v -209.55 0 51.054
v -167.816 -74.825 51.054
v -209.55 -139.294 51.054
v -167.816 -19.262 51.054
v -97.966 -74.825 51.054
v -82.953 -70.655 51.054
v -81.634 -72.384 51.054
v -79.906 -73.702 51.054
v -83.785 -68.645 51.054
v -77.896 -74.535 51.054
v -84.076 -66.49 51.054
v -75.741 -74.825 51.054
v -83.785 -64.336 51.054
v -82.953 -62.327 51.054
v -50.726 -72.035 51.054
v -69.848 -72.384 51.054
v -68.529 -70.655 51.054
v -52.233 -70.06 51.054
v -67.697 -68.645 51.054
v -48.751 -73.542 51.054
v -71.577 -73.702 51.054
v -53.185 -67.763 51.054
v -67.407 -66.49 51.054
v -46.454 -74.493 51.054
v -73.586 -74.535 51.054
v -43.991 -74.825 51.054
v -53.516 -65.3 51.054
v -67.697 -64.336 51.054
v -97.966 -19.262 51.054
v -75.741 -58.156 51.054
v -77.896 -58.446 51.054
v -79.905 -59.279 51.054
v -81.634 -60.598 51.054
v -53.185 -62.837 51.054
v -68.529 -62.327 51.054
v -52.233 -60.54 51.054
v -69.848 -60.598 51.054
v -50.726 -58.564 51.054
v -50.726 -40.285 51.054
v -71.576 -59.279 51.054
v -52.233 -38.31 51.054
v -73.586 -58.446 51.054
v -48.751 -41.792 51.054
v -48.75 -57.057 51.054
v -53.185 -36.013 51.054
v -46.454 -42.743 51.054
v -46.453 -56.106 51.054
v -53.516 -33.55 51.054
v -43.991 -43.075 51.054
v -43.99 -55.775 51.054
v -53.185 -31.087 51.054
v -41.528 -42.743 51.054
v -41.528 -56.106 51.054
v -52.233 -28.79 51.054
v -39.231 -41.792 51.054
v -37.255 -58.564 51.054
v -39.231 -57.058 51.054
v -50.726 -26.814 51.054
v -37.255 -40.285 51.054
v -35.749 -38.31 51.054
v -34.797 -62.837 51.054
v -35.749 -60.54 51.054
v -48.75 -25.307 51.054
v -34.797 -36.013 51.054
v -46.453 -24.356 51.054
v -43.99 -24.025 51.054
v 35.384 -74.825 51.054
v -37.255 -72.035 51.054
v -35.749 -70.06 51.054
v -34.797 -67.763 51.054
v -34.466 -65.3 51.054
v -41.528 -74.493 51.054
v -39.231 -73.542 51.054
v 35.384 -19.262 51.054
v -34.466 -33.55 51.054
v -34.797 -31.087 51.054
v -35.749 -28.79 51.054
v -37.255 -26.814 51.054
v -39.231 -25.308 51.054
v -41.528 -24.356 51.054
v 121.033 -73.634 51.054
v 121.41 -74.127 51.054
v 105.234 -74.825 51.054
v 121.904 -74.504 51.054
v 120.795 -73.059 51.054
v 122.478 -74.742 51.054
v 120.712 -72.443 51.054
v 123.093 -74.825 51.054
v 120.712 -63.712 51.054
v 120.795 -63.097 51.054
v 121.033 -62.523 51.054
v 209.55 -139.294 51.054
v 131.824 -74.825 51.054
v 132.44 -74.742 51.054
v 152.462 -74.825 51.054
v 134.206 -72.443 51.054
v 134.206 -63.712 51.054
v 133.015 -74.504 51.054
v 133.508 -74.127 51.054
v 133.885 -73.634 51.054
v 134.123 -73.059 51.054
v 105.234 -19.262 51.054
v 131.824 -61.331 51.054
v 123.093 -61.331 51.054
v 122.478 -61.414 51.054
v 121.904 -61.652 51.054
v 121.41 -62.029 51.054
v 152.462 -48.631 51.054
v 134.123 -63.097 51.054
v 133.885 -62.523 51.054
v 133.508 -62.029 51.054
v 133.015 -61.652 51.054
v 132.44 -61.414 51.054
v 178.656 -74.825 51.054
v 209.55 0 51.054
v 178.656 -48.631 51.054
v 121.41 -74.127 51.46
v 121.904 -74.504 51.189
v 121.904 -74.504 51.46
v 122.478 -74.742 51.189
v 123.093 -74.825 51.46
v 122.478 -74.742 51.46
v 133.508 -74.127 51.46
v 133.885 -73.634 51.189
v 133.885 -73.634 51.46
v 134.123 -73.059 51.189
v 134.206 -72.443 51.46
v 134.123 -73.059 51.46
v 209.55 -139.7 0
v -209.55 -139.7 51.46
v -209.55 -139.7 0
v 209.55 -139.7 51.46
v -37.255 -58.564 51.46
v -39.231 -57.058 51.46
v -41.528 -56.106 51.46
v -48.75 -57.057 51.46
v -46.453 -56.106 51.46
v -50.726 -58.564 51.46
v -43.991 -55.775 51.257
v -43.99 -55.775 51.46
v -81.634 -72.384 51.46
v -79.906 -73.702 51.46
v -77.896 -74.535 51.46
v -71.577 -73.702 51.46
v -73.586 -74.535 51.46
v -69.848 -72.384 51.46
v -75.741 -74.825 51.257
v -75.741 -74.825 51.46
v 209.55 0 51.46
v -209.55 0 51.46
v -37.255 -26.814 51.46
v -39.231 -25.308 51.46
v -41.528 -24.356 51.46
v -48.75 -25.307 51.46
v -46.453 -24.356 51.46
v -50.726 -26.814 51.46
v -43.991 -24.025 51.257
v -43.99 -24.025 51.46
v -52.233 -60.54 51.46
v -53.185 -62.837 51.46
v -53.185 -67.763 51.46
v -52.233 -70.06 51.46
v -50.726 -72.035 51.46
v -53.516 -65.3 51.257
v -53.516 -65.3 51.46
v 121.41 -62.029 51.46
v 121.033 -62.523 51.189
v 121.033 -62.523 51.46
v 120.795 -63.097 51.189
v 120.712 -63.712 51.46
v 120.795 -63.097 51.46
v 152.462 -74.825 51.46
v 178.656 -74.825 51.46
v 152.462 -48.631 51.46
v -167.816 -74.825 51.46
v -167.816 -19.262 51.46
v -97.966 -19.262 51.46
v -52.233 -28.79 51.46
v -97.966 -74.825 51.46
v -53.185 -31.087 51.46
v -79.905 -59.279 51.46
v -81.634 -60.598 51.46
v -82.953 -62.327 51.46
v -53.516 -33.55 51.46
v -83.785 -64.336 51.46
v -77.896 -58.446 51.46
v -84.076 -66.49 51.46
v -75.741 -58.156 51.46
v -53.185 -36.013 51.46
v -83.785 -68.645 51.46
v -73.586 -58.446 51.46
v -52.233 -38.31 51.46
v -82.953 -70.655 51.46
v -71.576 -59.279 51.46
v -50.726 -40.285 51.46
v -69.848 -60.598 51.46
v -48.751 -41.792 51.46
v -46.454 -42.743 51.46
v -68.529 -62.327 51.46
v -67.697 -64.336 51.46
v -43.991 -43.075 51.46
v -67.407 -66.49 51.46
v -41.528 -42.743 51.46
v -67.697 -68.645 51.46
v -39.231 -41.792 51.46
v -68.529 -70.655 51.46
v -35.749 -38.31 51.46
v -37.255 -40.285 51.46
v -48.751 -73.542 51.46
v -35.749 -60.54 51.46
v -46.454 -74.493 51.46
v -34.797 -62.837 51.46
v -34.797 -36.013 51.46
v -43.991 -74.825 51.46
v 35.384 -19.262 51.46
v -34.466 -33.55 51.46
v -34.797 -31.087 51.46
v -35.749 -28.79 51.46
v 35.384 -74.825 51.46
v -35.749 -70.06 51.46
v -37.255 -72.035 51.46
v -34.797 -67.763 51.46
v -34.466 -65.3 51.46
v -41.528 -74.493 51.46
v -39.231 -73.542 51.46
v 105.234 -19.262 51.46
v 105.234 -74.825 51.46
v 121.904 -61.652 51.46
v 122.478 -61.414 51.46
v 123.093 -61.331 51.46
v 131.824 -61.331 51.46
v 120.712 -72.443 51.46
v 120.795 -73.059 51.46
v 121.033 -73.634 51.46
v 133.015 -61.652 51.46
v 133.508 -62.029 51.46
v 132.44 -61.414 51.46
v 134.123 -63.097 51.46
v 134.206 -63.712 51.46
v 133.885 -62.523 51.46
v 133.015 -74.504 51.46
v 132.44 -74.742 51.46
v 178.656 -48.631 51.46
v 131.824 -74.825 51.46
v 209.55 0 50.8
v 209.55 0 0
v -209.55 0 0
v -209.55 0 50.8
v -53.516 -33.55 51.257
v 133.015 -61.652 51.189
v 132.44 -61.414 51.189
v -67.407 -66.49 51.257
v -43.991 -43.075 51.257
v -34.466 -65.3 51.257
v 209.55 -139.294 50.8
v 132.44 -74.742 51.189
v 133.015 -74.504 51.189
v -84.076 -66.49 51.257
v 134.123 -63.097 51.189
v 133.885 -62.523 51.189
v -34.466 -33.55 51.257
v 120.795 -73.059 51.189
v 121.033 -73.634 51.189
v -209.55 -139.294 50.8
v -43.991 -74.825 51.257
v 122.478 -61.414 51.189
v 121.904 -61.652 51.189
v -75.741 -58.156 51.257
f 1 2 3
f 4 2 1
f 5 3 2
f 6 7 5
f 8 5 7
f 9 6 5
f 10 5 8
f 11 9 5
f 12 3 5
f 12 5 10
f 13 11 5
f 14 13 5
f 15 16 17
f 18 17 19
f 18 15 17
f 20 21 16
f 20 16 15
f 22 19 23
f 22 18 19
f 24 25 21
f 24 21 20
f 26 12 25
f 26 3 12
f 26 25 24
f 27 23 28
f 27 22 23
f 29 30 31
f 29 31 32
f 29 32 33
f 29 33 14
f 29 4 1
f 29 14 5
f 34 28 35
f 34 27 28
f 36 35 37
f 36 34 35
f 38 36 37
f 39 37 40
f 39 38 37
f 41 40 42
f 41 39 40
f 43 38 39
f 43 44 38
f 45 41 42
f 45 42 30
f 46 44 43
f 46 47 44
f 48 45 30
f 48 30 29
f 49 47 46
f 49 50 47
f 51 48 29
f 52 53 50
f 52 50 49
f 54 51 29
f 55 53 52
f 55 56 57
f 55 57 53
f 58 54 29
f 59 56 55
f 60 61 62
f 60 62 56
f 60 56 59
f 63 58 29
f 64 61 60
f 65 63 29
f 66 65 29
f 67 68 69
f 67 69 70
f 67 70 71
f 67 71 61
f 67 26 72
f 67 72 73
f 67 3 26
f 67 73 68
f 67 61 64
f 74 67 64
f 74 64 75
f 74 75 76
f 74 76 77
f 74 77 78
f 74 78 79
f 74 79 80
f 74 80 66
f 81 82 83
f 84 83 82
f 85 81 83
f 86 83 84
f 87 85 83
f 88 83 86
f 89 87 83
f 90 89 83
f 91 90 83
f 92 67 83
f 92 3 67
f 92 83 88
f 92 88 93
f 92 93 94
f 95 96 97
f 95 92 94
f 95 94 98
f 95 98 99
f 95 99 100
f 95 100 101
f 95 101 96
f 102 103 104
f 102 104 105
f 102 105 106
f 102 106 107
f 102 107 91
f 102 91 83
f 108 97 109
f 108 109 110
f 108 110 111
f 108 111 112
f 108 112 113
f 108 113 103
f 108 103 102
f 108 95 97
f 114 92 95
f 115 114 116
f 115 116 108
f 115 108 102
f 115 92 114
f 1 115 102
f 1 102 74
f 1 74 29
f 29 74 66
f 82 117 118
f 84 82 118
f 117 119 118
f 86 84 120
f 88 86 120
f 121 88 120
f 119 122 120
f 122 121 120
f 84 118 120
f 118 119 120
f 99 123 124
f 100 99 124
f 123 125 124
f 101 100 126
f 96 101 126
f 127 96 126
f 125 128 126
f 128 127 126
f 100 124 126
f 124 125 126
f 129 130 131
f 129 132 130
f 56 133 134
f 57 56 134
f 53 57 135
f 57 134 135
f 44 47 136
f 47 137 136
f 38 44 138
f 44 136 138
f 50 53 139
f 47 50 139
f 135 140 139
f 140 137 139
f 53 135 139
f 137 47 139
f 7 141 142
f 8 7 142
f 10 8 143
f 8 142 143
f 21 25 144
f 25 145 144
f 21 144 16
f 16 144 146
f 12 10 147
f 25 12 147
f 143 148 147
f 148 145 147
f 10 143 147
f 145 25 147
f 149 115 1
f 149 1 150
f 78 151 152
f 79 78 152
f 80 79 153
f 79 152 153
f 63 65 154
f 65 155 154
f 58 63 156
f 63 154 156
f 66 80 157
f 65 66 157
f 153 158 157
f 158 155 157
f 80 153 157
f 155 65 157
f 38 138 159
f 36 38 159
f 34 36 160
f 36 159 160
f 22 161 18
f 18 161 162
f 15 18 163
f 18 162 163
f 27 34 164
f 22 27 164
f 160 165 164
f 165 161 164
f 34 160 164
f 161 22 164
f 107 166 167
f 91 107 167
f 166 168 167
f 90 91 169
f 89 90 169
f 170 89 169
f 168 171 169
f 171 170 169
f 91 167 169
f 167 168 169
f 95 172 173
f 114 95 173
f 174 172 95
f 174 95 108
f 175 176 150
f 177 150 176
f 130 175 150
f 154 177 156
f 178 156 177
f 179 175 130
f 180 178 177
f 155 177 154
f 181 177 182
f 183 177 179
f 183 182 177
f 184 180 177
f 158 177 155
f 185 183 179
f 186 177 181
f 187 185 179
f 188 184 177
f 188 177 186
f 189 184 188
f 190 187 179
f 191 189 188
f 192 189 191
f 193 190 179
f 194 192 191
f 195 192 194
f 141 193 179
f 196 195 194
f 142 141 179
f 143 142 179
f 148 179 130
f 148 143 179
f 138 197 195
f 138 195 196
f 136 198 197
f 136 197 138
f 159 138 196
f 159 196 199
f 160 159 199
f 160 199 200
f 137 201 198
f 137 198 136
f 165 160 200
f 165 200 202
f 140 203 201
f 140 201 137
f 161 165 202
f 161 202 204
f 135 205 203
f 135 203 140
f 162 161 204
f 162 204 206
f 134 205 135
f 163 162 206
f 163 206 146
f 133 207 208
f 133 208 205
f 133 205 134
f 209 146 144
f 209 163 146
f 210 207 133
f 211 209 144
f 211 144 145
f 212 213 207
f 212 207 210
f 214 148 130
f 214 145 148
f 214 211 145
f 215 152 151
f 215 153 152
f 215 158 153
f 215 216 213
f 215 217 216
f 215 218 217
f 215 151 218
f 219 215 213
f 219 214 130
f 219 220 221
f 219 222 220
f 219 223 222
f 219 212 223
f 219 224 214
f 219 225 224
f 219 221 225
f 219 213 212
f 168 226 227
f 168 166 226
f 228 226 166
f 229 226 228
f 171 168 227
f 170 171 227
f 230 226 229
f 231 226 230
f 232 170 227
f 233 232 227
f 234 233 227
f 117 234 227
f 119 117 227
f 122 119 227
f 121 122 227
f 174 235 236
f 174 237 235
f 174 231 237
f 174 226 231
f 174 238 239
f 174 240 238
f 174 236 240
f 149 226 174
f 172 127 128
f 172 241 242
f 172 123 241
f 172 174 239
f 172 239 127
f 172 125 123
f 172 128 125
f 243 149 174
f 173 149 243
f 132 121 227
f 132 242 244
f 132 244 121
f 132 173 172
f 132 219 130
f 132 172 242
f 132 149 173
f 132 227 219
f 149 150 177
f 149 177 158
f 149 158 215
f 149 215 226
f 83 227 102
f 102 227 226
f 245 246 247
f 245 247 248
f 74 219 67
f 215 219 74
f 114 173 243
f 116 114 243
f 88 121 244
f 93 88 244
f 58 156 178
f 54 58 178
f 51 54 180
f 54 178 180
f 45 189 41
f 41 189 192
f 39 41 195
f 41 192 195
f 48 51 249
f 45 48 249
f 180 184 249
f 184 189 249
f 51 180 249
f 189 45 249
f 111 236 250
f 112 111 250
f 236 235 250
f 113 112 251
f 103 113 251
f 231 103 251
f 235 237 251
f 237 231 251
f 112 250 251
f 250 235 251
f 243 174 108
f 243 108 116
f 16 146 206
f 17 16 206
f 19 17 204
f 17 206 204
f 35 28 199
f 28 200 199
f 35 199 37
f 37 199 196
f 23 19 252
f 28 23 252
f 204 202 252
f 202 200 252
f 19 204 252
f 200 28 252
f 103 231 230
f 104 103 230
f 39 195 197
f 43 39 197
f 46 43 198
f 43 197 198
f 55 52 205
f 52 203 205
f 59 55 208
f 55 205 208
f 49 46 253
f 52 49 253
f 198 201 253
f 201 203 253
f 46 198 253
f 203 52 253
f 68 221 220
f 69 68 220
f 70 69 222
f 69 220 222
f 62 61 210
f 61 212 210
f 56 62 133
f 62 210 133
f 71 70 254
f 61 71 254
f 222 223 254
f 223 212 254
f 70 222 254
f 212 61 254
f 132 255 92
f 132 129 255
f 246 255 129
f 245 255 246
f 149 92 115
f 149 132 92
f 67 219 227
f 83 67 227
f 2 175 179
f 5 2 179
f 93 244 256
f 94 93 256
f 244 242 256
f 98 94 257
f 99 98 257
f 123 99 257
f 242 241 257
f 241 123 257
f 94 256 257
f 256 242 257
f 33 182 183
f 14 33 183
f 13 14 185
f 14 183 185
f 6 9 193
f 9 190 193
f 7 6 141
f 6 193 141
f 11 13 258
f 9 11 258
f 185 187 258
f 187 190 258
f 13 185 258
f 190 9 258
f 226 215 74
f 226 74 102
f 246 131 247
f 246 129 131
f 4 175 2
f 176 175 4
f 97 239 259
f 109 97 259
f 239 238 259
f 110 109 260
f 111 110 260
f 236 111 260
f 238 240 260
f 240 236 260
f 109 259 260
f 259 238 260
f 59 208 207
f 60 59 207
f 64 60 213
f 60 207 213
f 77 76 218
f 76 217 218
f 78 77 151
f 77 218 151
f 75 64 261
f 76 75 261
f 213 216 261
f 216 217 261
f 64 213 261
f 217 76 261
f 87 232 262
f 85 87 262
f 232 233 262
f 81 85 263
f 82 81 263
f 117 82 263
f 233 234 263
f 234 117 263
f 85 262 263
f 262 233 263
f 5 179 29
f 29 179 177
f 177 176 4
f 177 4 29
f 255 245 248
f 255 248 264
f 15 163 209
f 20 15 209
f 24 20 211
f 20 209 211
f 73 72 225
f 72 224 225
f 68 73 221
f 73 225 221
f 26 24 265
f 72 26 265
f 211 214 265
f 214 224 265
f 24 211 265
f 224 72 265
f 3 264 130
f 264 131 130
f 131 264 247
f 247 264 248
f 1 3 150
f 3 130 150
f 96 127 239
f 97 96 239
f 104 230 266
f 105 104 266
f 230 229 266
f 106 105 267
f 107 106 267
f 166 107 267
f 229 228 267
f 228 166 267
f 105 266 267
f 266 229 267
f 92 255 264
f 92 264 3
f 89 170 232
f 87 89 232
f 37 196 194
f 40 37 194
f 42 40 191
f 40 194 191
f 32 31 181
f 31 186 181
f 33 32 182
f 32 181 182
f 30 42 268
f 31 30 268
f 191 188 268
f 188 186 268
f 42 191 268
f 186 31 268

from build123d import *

# Parameters (mm, degrees)
F1_DEPTH = 209.55
F2_W     = 69.85
F2_H     = 55.5625
F2_W_2   = 26.19375
F2_H_2   = 26.19375
F3_DEPTH = 0.4064


# Not quite as in the source:
# - the dataset's text gives a spline's control points without its knots; the knots are read off the source's solid


with BuildPart() as f1:
    # F0 (on Right) → F1 (new body, symmetric)
    with BuildSketch(Plane.YZ):
        Polygon((-139.7, 0), (0, 0), (0, 50.8), (-139.2936, 50.8), (-139.2936, 51.054), (0, 51.054), (0, 51.4604), (-139.7, 51.4604), align=None)
    extrude(amount=F1_DEPTH, both=True)

    # F2 (on face) → F3 (cut, through all)
    with BuildSketch(Plane.XY.offset(51.4604)):
        with Locations((-132.8911783457, -47.0433160888)):
            Rectangle(F2_W, F2_H)
        with Locations((70.3088216543, -47.0433160888)):
            Rectangle(F2_W, F2_H)
        with BuildLine():
            add(Edge.make_bspline(
                [(121.4099132543, -62.0291382888), (120.9689438543, -62.4693964888), (120.7119466543, -63.0892072888), (120.7119466543, -63.7120660888)],
                knots=[1, 1, 1, 1, 2, 2, 2, 2], degree=3))
            Line((120.7119466543, -63.7120660888), (120.7119466543, -72.4433160888))
            add(Edge.make_bspline(
                [(120.7119466543, -72.4433160888), (120.7119466543, -73.0672416888), (120.9689438543, -73.6870016888), (121.4099132543, -74.1272598888)],
                knots=[0, 0, 0, 0, 1, 1, 1, 1], degree=3))
            add(Edge.make_bspline(
                [(121.4099132543, -74.1272598888), (121.8505270543, -74.5682292888), (122.4699822543, -74.8245660888), (123.0931966543, -74.8245660888)],
                knots=[1, 1, 1, 1, 2, 2, 2, 2], degree=3))
            Line((123.0931966543, -74.8245660888), (131.8244466543, -74.8245660888))
            add(Edge.make_bspline(
                [(131.8244466543, -74.8245660888), (132.4483468543, -74.8245660888), (133.0677766543, -74.5682292888), (133.5083904543, -74.1272598888)],
                knots=[0, 0, 0, 0, 1, 1, 1, 1], degree=3))
            add(Edge.make_bspline(
                [(133.5083904543, -74.1272598888), (133.9490042543, -73.6870016888), (134.2056966543, -73.0672416888), (134.2056966543, -72.4433160888)],
                knots=[1, 1, 1, 1, 2, 2, 2, 2], degree=3))
            Line((134.2056966543, -72.4433160888), (134.2056966543, -63.7120660888))
            add(Edge.make_bspline(
                [(134.2056966543, -63.7120660888), (134.2056966543, -63.0892072888), (133.9490042543, -62.4693964888), (133.5083904543, -62.0291382888)],
                knots=[0, 0, 0, 0, 1, 1, 1, 1], degree=3))
            add(Edge.make_bspline(
                [(133.5083904543, -62.0291382888), (133.0677766543, -61.5881688888), (132.4483468543, -61.3308160888), (131.8244466543, -61.3308160888)],
                knots=[1, 1, 1, 1, 2, 2, 2, 2], degree=3))
            Line((131.8244466543, -61.3308160888), (123.0931966543, -61.3308160888))
            add(Edge.make_bspline(
                [(123.0931966543, -61.3308160888), (122.4699822543, -61.3308160888), (121.8505270543, -61.5881688888), (121.4099132543, -62.0291382888)],
                knots=[0, 0, 0, 0, 1, 1, 1, 1], degree=3))
        make_face()
        with Locations((165.5588216543, -61.7276910888)):
            Rectangle(F2_W_2, F2_H_2)
        with BuildLine():
            add(Edge.make_bspline(
                [(-69.8476671457, -60.5980514888), (-71.3907171457, -59.0546712888), (-73.5590643457, -58.1558160888), (-75.7411783457, -58.1558160888)],
                knots=[7, 7, 7, 7, 8, 8, 8, 8], degree=3))
            add(Edge.make_bspline(
                [(-75.7411783457, -58.1558160888), (-77.9229621457, -58.1558160888), (-80.0913093457, -59.0546712888), (-81.6343593457, -60.5980514888)],
                knots=[0, 0, 0, 0, 1, 1, 1, 1], degree=3))
            add(Edge.make_bspline(
                [(-81.6343593457, -60.5980514888), (-83.1771045457, -62.1407712888), (-84.0755533457, -64.3087628888), (-84.0755533457, -66.4901910888), (-84.0755533457, -68.6726606888), (-83.1771045457, -70.8406522888), (-81.6343593457, -72.3840578888)],
                knots=[1, 1, 1, 1, 2, 2, 2, 3, 3, 3, 3], degree=3))
            add(Edge.make_bspline(
                [(-81.6343593457, -72.3840578888), (-80.0913093457, -73.9267776888), (-77.9229621457, -74.8245660888), (-75.7411783457, -74.8245660888), (-73.5590643457, -74.8245660888), (-71.3907171457, -73.9267776888), (-69.8476671457, -72.3840578888)],
                knots=[3, 3, 3, 3, 4, 4, 4, 5, 5, 5, 5], degree=3))
            add(Edge.make_bspline(
                [(-69.8476671457, -72.3840578888), (-68.3049219457, -70.8406522888), (-67.4068033457, -68.6726606888), (-67.4068033457, -66.4901910888), (-67.4068033457, -64.3087628888), (-68.3049219457, -62.1407712888), (-69.8476671457, -60.5980514888)],
                knots=[5, 5, 5, 5, 6, 6, 6, 7, 7, 7, 7], degree=3))
        make_face()
        with BuildLine():
            add(Edge.make_bspline(
                [(-37.2553269457, -58.5644004888), (-39.0188743457, -56.8012086888), (-41.4972793457, -55.7745660888), (-43.9911783457, -55.7745660888)],
                knots=[7, 7, 7, 7, 8, 8, 8, 8], degree=3))
            add(Edge.make_bspline(
                [(-43.9911783457, -55.7745660888), (-46.4843915457, -55.7745660888), (-48.9631521457, -56.8012086888), (-50.7263439457, -58.5644004888)],
                knots=[0, 0, 0, 0, 1, 1, 1, 1], degree=3))
            add(Edge.make_bspline(
                [(-50.7263439457, -58.5644004888), (-52.4895611457, -60.3283034888), (-53.5161783457, -62.8063528888), (-53.5161783457, -65.2995660888), (-53.5161783457, -67.7938206888), (-52.4895611457, -70.2725812888), (-50.7263439457, -72.0350872888)],
                knots=[1, 1, 1, 1, 2, 2, 2, 3, 3, 3, 3], degree=3))
            add(Edge.make_bspline(
                [(-50.7263439457, -72.0350872888), (-48.9631521457, -73.7989648888), (-46.4843915457, -74.8245660888), (-43.9911783457, -74.8245660888), (-41.4972793457, -74.8245660888), (-39.0188743457, -73.7989648888), (-37.2553269457, -72.0350872888)],
                knots=[3, 3, 3, 3, 4, 4, 4, 5, 5, 5, 5], degree=3))
            add(Edge.make_bspline(
                [(-37.2553269457, -72.0350872888), (-35.4921351457, -70.2725812888), (-34.4661783457, -67.7938206888), (-34.4661783457, -65.2995660888), (-34.4661783457, -62.8063528888), (-35.4921351457, -60.3283034888), (-37.2553269457, -58.5644004888)],
                knots=[5, 5, 5, 5, 6, 6, 6, 7, 7, 7, 7], degree=3))
        make_face()
        with BuildLine():
            add(Edge.make_bspline(
                [(-37.2553269457, -26.8144004888), (-39.0188743457, -25.0512086888), (-41.4972793457, -24.0245660888), (-43.9911783457, -24.0245660888)],
                knots=[7, 7, 7, 7, 8, 8, 8, 8], degree=3))
            add(Edge.make_bspline(
                [(-43.9911783457, -24.0245660888), (-46.4843915457, -24.0245660888), (-48.9631521457, -25.0512086888), (-50.7263439457, -26.8144004888)],
                knots=[0, 0, 0, 0, 1, 1, 1, 1], degree=3))
            add(Edge.make_bspline(
                [(-50.7263439457, -26.8144004888), (-52.4895611457, -28.5783034888), (-53.5161783457, -31.0563528888), (-53.5161783457, -33.5495660888), (-53.5161783457, -36.0438206888), (-52.4895611457, -38.5225812888), (-50.7263439457, -40.2850872888)],
                knots=[1, 1, 1, 1, 2, 2, 2, 3, 3, 3, 3], degree=3))
            add(Edge.make_bspline(
                [(-50.7263439457, -40.2850872888), (-48.9631521457, -42.0489648888), (-46.4843915457, -43.0745660888), (-43.9911783457, -43.0745660888), (-41.4972793457, -43.0745660888), (-39.0188743457, -42.0489648888), (-37.2553269457, -40.2850872888)],
                knots=[3, 3, 3, 3, 4, 4, 4, 5, 5, 5, 5], degree=3))
            add(Edge.make_bspline(
                [(-37.2553269457, -40.2850872888), (-35.4921351457, -38.5225812888), (-34.4661783457, -36.0438206888), (-34.4661783457, -33.5495660888), (-34.4661783457, -31.0563528888), (-35.4921351457, -28.5783034888), (-37.2553269457, -26.8144004888)],
                knots=[5, 5, 5, 5, 6, 6, 6, 7, 7, 7, 7], degree=3))
        make_face()
    extrude(amount=-F3_DEPTH, mode=Mode.SUBTRACT)


solid = f1.part
